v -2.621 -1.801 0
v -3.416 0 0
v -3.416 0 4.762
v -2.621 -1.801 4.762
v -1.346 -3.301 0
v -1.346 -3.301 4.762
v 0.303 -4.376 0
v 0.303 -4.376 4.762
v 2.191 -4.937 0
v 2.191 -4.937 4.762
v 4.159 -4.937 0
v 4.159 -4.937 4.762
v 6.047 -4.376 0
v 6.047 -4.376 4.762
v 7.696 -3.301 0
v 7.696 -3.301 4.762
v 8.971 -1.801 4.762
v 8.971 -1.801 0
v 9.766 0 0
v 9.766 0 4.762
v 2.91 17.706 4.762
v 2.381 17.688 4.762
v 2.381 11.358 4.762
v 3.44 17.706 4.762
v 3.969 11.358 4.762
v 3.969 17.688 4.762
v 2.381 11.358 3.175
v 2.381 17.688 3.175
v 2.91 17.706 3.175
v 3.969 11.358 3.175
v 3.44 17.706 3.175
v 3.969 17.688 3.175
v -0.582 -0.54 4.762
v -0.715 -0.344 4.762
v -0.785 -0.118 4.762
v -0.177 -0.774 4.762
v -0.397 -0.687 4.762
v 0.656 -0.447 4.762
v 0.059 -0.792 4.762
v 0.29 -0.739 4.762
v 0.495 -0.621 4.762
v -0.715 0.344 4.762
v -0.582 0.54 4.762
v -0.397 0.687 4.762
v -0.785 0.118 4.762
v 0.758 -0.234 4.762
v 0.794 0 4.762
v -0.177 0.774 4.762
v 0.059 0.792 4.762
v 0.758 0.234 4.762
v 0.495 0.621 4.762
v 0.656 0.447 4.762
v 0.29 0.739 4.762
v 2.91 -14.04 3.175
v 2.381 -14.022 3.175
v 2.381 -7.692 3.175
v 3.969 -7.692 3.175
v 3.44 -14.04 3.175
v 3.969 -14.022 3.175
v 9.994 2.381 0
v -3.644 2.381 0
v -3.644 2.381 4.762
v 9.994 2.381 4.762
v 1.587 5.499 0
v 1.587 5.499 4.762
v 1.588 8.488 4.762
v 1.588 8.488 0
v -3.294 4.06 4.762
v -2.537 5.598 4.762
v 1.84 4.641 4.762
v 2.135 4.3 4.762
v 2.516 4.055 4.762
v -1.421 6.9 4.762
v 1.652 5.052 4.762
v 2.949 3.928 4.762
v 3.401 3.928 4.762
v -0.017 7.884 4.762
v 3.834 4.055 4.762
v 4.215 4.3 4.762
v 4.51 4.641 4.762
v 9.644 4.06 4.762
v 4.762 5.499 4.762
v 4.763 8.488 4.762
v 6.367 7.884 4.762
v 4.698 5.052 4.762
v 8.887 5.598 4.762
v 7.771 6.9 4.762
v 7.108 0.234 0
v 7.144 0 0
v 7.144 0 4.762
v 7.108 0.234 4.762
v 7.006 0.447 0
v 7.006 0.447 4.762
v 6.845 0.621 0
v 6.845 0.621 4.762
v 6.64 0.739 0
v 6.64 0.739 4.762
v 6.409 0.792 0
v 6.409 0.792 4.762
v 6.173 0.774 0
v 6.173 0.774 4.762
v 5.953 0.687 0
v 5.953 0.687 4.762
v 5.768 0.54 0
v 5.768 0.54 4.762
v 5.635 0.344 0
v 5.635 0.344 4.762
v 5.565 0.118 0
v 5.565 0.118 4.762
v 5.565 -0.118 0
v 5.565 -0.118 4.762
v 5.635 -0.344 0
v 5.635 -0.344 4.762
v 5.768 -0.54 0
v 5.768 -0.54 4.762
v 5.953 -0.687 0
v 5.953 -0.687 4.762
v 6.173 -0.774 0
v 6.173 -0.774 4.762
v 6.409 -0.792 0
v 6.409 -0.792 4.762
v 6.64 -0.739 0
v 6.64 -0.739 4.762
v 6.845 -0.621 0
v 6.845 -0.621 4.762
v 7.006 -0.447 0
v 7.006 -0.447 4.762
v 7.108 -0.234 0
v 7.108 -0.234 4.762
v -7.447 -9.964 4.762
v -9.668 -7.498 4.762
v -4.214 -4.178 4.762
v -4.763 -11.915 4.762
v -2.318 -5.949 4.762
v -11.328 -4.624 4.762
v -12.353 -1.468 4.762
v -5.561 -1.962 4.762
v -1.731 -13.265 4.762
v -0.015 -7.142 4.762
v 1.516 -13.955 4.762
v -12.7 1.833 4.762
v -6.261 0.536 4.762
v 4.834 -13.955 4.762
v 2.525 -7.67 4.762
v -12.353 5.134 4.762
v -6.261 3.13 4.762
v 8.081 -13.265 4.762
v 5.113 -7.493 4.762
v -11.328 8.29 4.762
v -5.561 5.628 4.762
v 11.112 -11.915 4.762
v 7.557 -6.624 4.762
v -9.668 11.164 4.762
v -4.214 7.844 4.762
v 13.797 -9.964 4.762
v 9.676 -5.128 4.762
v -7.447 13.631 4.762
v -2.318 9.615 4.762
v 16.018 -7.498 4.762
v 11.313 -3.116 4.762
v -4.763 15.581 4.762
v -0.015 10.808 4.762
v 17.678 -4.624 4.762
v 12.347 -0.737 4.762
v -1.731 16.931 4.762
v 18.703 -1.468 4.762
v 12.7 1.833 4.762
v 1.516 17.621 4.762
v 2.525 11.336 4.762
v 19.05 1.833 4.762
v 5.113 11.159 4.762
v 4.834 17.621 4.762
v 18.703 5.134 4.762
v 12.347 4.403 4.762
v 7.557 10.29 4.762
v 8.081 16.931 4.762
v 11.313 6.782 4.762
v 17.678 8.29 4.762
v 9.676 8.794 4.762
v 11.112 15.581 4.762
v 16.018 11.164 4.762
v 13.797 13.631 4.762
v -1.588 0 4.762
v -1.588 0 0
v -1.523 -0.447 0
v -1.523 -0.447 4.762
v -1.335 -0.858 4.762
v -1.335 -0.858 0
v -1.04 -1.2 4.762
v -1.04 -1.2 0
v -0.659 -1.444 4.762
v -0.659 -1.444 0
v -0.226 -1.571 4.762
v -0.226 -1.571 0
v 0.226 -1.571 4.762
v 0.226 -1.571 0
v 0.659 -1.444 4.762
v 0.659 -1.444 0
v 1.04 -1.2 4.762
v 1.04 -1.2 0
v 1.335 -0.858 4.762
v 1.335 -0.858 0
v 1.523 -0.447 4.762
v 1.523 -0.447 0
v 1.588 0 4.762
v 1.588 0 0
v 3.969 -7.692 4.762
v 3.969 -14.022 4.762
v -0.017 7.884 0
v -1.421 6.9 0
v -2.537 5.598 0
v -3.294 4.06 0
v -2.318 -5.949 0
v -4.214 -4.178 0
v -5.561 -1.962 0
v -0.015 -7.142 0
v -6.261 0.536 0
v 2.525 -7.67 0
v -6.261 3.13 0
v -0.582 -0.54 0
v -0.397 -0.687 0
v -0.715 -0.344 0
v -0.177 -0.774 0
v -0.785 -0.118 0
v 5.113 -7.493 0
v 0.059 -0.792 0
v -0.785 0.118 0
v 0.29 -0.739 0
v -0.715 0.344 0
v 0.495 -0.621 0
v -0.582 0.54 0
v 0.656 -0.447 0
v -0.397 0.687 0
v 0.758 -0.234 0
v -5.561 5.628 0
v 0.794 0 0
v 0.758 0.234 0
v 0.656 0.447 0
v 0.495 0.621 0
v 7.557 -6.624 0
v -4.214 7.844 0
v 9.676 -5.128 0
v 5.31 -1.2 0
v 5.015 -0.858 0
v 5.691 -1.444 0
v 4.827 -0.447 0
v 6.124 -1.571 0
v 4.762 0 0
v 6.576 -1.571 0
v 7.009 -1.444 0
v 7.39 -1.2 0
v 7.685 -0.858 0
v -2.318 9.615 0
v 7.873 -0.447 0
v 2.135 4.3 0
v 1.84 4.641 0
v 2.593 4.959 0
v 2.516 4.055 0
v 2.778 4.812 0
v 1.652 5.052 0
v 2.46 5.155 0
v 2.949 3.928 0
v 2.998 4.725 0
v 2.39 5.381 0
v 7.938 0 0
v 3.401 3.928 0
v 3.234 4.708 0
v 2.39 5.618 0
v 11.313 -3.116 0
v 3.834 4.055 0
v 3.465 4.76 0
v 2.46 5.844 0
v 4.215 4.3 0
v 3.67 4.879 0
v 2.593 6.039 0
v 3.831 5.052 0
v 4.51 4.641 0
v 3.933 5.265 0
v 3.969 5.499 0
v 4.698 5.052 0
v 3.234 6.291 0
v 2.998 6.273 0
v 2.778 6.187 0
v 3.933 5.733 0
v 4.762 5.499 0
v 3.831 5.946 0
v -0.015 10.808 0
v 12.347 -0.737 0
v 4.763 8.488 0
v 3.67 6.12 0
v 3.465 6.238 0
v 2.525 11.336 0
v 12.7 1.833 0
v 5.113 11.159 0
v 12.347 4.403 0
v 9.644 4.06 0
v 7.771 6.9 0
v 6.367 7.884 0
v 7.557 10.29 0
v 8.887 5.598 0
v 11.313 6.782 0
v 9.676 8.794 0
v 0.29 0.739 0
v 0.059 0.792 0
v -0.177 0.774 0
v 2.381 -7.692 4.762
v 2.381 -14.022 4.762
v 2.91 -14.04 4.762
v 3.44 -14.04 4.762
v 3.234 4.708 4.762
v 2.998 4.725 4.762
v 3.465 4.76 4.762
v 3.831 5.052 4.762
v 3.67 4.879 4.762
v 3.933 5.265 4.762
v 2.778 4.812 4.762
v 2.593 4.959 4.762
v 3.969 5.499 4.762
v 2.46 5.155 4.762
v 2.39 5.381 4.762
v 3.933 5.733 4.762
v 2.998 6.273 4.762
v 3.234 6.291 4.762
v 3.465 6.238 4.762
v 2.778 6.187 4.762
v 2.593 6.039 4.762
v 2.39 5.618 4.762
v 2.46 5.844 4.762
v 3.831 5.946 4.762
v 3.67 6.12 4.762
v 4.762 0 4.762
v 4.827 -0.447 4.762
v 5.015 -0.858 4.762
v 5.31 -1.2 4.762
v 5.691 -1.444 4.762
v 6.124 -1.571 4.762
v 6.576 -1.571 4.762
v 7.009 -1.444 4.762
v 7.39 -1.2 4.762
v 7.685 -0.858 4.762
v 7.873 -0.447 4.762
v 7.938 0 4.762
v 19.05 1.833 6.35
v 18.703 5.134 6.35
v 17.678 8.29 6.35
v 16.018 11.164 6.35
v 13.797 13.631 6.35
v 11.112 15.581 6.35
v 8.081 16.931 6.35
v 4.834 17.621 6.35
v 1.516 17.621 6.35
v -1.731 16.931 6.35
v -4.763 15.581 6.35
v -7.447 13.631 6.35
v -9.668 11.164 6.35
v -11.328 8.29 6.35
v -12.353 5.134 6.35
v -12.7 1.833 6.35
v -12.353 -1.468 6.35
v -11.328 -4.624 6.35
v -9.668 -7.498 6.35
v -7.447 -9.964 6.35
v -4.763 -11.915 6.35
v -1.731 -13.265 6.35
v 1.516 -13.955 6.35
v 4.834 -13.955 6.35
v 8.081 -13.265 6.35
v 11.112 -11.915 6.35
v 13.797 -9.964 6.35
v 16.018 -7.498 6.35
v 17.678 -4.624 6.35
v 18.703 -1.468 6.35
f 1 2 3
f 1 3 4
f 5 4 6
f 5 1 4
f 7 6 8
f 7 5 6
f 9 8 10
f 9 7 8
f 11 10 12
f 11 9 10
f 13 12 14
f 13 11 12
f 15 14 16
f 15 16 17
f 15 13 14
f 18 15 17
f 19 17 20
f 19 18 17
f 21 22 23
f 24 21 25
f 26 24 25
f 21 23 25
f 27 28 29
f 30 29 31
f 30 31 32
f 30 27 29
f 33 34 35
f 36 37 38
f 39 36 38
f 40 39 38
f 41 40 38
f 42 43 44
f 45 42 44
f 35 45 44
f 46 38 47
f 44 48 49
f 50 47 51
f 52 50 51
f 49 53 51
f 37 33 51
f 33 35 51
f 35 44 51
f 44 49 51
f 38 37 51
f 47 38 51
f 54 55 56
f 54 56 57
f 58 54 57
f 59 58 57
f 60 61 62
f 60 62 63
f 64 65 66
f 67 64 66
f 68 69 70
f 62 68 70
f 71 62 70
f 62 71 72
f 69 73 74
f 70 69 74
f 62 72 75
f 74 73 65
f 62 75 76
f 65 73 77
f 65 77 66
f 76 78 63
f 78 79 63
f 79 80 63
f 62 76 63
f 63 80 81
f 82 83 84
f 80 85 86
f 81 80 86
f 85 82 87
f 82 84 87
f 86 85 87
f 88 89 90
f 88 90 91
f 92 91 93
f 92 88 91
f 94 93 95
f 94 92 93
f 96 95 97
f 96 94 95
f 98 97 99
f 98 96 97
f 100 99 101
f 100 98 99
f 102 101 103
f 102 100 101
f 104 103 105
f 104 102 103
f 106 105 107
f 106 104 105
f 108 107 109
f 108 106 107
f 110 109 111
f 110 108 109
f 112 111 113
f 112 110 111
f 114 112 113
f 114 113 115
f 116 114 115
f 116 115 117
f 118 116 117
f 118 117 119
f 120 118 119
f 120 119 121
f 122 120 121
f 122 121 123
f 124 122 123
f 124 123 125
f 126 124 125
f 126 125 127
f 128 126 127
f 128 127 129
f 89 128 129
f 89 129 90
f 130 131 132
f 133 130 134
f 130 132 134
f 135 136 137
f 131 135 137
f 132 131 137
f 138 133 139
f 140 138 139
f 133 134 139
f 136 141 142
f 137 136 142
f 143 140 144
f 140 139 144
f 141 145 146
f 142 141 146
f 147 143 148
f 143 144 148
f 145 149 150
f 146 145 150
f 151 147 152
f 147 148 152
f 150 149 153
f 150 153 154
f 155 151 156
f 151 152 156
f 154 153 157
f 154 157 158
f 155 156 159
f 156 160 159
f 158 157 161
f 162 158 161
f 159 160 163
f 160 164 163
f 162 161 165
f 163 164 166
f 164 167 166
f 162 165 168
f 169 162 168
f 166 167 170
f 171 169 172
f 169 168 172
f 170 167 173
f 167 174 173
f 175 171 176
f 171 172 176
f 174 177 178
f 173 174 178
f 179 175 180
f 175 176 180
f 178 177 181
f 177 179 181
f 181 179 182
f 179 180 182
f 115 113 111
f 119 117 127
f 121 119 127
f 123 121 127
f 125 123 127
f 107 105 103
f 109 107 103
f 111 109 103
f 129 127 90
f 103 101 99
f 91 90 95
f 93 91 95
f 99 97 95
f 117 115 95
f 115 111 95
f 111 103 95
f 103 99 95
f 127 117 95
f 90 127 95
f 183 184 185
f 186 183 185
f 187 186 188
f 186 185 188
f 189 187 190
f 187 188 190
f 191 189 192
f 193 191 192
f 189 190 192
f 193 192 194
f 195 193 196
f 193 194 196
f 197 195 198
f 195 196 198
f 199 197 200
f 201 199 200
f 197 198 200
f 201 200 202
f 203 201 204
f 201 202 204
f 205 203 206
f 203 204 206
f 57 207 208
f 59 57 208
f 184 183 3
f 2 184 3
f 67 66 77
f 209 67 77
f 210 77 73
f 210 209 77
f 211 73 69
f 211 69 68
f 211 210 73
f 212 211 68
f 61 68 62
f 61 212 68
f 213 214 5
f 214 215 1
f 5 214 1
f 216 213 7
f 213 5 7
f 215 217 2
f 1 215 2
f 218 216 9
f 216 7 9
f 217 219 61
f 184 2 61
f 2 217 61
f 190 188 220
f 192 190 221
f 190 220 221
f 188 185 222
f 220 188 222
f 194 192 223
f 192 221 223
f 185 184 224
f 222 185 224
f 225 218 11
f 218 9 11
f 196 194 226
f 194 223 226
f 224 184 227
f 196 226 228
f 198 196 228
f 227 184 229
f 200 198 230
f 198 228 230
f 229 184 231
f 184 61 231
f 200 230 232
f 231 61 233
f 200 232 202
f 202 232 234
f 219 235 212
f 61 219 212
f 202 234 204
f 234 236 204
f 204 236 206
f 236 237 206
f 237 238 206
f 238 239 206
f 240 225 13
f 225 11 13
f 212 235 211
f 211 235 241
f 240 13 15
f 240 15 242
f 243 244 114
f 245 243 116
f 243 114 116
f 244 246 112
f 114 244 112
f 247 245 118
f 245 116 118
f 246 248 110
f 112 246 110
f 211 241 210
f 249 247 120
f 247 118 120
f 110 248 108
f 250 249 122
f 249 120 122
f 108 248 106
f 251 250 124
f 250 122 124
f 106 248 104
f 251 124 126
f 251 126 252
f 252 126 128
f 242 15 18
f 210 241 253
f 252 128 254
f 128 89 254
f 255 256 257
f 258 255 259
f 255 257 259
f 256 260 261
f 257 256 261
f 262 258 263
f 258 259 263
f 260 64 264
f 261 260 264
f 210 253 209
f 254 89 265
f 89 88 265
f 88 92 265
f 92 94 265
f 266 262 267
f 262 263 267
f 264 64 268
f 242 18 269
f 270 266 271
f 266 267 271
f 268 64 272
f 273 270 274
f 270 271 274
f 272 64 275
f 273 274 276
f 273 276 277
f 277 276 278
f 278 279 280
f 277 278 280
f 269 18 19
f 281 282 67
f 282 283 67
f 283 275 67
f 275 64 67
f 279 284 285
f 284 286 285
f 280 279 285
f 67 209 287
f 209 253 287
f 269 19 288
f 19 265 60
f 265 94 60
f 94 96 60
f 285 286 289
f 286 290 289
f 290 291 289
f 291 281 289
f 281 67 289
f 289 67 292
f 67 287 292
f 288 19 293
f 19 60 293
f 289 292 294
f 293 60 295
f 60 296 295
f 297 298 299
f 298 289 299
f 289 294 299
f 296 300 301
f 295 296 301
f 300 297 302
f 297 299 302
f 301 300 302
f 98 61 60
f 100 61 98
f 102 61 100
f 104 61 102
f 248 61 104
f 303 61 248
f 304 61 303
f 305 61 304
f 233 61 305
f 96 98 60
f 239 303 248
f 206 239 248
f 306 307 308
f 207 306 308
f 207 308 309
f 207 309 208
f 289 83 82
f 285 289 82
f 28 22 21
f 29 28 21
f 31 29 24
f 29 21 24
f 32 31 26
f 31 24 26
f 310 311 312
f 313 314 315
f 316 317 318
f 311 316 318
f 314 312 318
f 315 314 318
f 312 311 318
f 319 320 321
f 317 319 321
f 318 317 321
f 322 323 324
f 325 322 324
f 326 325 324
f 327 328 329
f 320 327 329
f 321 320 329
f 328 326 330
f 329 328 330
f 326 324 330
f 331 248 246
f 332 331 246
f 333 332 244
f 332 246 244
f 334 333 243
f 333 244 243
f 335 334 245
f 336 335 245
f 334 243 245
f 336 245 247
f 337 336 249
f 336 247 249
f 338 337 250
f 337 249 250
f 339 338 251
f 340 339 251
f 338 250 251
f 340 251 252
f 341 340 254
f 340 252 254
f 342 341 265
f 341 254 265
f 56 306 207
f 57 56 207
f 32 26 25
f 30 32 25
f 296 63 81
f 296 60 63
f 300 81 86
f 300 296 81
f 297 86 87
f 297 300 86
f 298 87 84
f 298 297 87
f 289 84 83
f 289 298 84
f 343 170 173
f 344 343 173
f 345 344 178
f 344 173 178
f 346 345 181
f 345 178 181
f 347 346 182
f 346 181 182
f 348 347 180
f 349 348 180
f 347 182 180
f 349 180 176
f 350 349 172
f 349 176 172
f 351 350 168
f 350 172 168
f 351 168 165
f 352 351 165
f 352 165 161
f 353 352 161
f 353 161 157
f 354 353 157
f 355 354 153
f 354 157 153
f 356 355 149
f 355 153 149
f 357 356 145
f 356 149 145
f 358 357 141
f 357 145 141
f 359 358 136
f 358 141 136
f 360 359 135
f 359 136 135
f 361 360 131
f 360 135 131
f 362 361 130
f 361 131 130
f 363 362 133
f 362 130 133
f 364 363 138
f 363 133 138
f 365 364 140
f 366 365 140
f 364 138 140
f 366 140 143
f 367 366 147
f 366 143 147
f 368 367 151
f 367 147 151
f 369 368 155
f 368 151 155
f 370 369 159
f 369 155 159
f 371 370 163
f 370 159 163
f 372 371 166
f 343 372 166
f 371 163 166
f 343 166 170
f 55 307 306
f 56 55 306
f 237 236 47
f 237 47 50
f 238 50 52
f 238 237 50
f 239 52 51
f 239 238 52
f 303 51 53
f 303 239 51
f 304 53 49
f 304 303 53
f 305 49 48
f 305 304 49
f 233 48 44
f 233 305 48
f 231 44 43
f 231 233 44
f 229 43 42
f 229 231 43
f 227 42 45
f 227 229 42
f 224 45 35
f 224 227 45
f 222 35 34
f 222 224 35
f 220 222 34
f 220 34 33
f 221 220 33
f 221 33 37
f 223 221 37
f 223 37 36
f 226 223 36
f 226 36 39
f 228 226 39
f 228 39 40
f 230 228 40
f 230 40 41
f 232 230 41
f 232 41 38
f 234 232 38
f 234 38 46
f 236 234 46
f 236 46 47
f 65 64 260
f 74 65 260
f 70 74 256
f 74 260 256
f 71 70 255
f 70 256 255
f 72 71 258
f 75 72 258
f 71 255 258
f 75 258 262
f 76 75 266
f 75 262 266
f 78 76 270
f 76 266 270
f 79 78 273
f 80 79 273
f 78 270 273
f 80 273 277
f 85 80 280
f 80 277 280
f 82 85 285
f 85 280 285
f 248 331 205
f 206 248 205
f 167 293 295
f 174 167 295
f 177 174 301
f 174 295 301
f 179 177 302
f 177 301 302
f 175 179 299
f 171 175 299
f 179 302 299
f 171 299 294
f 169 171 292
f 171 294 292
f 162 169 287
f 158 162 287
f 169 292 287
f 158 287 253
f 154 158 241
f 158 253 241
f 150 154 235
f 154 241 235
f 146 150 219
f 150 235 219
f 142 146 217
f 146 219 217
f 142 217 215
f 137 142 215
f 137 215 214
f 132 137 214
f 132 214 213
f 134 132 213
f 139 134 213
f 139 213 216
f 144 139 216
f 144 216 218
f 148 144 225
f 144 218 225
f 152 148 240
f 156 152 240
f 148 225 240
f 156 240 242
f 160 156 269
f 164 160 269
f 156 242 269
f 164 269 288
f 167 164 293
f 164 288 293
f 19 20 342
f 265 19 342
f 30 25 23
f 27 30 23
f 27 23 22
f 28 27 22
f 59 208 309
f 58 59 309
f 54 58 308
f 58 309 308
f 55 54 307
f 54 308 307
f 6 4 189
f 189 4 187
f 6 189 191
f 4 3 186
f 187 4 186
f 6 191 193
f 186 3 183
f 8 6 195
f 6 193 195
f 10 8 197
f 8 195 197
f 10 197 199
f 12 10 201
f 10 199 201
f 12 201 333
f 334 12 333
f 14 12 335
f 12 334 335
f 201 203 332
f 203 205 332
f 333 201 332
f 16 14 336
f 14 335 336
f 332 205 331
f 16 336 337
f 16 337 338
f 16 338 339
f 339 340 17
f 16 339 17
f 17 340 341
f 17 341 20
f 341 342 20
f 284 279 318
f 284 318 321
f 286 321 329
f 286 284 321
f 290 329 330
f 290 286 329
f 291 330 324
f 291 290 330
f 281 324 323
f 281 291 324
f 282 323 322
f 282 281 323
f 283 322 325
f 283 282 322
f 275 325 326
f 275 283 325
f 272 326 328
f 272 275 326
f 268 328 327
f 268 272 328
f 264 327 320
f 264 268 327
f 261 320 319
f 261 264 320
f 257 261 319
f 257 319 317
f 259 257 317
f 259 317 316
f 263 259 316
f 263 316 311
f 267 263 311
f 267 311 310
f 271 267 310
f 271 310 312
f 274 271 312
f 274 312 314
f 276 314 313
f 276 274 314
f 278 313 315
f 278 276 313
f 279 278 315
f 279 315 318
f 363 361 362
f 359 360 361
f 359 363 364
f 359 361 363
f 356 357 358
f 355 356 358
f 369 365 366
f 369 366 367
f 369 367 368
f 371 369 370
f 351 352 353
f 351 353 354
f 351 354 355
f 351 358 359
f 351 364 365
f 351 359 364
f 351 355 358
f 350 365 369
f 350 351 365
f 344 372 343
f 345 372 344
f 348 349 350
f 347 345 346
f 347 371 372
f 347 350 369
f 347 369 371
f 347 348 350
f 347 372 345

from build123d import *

# Parameters (mm, degrees)
F0_R     = 1.5875
F0_R_2   = 0.79375
F1_DEPTH = 4.7625
F0_R_3   = 9.525
F0_R_4   = 6.8411742094
F2_R     = 15.875
F3_DEPTH = 1.5875
F5_DEPTH = 1.5875
F7_DEPTH = 4.7625
F8_W     = 13.6823484187
F8_H     = 0.79375
F9_DEPTH = 4.7625


with BuildPart() as f1:
    # F0 (on Top) → F1 (new body)
    with BuildSketch(Plane.XY):
        with Locations((3.175, 5.499261314)):
            Circle(F0_R)
        with Locations((3.175, 5.499261314)):
            Circle(F0_R_2, mode=Mode.SUBTRACT)
    extrude(amount=F1_DEPTH)



with BuildPart() as f1b:
    # F0 (on Top) → F1, piece 2 (new body)
    with BuildSketch(Plane.XY):
        Circle(F0_R)
        Circle(F0_R_2, mode=Mode.SUBTRACT)
    extrude(amount=F1_DEPTH)


with BuildPart() as f1c:
    # F0 (on Top) → F1, piece 3 (new body)
    with BuildSketch(Plane.XY):
        with Locations((6.35, 0)):
            Circle(F0_R)
        with Locations((6.35, 0)):
            Circle(F0_R_2, mode=Mode.SUBTRACT)
    extrude(amount=F1_DEPTH)


with BuildPart() as f1d:
    # F0 (on Top) → F1, piece 4 (new body)
    with BuildSketch(Plane.XY):
        with Locations((3.175, 1.8330871047)):
            Circle(F0_R_3)
        with Locations((3.175, 1.8330871047)):
            Circle(F0_R_4, mode=Mode.SUBTRACT)
    extrude(amount=F1_DEPTH)


with BuildPart() as f1_1:
    add(f1.part)

    add(f1b.part)  # F3 merges F1b

    add(f1c.part)  # F3 merges F1c

    add(f1d.part)  # F3 merges F1d
    # F2 (on face) → F3 (join)
    with BuildSketch(Plane.XY.offset(4.7625)):
        with Locations((3.175, 1.8330871047)):
            Circle(F2_R)
    extrude(amount=F3_DEPTH)

    # F6 (on face) → F7 (join, through all)
    with BuildSketch(Plane(origin=(0, 0, 4.7625), x_dir=(1, 0, 0), z_dir=(0, 0, -1))):
        with BuildLine():
            Line((5.55625, 0), (0.79375, 0))
            ThreePointArc((0.79375, 0), (0, -0.79375), (-0.79375, 0))
            Line((-0.79375, 0), (-3.6617646981, 0))
            Line((-3.6617646981, 0), (-3.6617646981, -1.5875))
            Line((-3.6617646981, -1.5875), (10.0117646981, -1.5875))
            Line((10.0117646981, -1.5875), (10.0117646981, 0))
            Line((10.0117646981, 0), (7.14375, 0))
            ThreePointArc((7.14375, 0), (6.35, -0.79375), (5.55625, 0))
        make_face()
        with BuildLine():
            ThreePointArc((4.7625, -5.499261314), (3.175, -7.086761314), (1.5875, -5.499261314))
            Line((1.5875, -5.499261314), (1.5875, -8.674261314))
            Line((1.5875, -8.674261314), (4.7625, -8.674261314))
            Line((4.7625, -8.674261314), (4.7625, -5.499261314))
        make_face()
    extrude(amount=F7_DEPTH)

    # F8 (on face) → F9 (join, through all)
    with BuildSketch(Plane(origin=(0, 0, 0), x_dir=(1, 0, 0), z_dir=(0, 0, -1))):
        with Locations((3.175, -1.984375)):
            Rectangle(F8_W, F8_H)
    extrude(amount=-F9_DEPTH)


with BuildPart() as f5:
    # F4 (on face) → F5 (new body)
    with BuildSketch(Plane(origin=(0, 0, 4.7625), x_dir=(1, 0, 0), z_dir=(0, 0, -1))):
        with BuildLine():
            Line((2.38125, 14.0220567275), (2.38125, 7.6919128953))
            Line((2.38125, 7.6919128953), (3.96875, 7.6919128953))
            Line((3.96875, 7.6919128953), (3.96875, 14.0220567275))
            ThreePointArc((3.96875, 14.0220567275), (3.175, 14.0419128953), (2.38125, 14.0220567275))
        make_face()
    extrude(amount=F5_DEPTH)


with BuildPart() as f5b:
    # F4 (on face) → F5, piece 2 (new body)
    with BuildSketch(Plane(origin=(0, 0, 4.7625), x_dir=(1, 0, 0), z_dir=(0, 0, -1))):
        with BuildLine():
            Line((3.96875, -11.3580871047), (2.38125, -11.3580871047))
            Line((2.38125, -11.3580871047), (2.38125, -17.6882309368))
            ThreePointArc((2.38125, -17.6882309368), (3.175, -17.7080871047), (3.96875, -17.6882309368))
            Line((3.96875, -17.6882309368), (3.96875, -11.3580871047))
        make_face()
    extrude(amount=F5_DEPTH)


solid = Compound([f1_1.part, f5.part, f5b.part])
